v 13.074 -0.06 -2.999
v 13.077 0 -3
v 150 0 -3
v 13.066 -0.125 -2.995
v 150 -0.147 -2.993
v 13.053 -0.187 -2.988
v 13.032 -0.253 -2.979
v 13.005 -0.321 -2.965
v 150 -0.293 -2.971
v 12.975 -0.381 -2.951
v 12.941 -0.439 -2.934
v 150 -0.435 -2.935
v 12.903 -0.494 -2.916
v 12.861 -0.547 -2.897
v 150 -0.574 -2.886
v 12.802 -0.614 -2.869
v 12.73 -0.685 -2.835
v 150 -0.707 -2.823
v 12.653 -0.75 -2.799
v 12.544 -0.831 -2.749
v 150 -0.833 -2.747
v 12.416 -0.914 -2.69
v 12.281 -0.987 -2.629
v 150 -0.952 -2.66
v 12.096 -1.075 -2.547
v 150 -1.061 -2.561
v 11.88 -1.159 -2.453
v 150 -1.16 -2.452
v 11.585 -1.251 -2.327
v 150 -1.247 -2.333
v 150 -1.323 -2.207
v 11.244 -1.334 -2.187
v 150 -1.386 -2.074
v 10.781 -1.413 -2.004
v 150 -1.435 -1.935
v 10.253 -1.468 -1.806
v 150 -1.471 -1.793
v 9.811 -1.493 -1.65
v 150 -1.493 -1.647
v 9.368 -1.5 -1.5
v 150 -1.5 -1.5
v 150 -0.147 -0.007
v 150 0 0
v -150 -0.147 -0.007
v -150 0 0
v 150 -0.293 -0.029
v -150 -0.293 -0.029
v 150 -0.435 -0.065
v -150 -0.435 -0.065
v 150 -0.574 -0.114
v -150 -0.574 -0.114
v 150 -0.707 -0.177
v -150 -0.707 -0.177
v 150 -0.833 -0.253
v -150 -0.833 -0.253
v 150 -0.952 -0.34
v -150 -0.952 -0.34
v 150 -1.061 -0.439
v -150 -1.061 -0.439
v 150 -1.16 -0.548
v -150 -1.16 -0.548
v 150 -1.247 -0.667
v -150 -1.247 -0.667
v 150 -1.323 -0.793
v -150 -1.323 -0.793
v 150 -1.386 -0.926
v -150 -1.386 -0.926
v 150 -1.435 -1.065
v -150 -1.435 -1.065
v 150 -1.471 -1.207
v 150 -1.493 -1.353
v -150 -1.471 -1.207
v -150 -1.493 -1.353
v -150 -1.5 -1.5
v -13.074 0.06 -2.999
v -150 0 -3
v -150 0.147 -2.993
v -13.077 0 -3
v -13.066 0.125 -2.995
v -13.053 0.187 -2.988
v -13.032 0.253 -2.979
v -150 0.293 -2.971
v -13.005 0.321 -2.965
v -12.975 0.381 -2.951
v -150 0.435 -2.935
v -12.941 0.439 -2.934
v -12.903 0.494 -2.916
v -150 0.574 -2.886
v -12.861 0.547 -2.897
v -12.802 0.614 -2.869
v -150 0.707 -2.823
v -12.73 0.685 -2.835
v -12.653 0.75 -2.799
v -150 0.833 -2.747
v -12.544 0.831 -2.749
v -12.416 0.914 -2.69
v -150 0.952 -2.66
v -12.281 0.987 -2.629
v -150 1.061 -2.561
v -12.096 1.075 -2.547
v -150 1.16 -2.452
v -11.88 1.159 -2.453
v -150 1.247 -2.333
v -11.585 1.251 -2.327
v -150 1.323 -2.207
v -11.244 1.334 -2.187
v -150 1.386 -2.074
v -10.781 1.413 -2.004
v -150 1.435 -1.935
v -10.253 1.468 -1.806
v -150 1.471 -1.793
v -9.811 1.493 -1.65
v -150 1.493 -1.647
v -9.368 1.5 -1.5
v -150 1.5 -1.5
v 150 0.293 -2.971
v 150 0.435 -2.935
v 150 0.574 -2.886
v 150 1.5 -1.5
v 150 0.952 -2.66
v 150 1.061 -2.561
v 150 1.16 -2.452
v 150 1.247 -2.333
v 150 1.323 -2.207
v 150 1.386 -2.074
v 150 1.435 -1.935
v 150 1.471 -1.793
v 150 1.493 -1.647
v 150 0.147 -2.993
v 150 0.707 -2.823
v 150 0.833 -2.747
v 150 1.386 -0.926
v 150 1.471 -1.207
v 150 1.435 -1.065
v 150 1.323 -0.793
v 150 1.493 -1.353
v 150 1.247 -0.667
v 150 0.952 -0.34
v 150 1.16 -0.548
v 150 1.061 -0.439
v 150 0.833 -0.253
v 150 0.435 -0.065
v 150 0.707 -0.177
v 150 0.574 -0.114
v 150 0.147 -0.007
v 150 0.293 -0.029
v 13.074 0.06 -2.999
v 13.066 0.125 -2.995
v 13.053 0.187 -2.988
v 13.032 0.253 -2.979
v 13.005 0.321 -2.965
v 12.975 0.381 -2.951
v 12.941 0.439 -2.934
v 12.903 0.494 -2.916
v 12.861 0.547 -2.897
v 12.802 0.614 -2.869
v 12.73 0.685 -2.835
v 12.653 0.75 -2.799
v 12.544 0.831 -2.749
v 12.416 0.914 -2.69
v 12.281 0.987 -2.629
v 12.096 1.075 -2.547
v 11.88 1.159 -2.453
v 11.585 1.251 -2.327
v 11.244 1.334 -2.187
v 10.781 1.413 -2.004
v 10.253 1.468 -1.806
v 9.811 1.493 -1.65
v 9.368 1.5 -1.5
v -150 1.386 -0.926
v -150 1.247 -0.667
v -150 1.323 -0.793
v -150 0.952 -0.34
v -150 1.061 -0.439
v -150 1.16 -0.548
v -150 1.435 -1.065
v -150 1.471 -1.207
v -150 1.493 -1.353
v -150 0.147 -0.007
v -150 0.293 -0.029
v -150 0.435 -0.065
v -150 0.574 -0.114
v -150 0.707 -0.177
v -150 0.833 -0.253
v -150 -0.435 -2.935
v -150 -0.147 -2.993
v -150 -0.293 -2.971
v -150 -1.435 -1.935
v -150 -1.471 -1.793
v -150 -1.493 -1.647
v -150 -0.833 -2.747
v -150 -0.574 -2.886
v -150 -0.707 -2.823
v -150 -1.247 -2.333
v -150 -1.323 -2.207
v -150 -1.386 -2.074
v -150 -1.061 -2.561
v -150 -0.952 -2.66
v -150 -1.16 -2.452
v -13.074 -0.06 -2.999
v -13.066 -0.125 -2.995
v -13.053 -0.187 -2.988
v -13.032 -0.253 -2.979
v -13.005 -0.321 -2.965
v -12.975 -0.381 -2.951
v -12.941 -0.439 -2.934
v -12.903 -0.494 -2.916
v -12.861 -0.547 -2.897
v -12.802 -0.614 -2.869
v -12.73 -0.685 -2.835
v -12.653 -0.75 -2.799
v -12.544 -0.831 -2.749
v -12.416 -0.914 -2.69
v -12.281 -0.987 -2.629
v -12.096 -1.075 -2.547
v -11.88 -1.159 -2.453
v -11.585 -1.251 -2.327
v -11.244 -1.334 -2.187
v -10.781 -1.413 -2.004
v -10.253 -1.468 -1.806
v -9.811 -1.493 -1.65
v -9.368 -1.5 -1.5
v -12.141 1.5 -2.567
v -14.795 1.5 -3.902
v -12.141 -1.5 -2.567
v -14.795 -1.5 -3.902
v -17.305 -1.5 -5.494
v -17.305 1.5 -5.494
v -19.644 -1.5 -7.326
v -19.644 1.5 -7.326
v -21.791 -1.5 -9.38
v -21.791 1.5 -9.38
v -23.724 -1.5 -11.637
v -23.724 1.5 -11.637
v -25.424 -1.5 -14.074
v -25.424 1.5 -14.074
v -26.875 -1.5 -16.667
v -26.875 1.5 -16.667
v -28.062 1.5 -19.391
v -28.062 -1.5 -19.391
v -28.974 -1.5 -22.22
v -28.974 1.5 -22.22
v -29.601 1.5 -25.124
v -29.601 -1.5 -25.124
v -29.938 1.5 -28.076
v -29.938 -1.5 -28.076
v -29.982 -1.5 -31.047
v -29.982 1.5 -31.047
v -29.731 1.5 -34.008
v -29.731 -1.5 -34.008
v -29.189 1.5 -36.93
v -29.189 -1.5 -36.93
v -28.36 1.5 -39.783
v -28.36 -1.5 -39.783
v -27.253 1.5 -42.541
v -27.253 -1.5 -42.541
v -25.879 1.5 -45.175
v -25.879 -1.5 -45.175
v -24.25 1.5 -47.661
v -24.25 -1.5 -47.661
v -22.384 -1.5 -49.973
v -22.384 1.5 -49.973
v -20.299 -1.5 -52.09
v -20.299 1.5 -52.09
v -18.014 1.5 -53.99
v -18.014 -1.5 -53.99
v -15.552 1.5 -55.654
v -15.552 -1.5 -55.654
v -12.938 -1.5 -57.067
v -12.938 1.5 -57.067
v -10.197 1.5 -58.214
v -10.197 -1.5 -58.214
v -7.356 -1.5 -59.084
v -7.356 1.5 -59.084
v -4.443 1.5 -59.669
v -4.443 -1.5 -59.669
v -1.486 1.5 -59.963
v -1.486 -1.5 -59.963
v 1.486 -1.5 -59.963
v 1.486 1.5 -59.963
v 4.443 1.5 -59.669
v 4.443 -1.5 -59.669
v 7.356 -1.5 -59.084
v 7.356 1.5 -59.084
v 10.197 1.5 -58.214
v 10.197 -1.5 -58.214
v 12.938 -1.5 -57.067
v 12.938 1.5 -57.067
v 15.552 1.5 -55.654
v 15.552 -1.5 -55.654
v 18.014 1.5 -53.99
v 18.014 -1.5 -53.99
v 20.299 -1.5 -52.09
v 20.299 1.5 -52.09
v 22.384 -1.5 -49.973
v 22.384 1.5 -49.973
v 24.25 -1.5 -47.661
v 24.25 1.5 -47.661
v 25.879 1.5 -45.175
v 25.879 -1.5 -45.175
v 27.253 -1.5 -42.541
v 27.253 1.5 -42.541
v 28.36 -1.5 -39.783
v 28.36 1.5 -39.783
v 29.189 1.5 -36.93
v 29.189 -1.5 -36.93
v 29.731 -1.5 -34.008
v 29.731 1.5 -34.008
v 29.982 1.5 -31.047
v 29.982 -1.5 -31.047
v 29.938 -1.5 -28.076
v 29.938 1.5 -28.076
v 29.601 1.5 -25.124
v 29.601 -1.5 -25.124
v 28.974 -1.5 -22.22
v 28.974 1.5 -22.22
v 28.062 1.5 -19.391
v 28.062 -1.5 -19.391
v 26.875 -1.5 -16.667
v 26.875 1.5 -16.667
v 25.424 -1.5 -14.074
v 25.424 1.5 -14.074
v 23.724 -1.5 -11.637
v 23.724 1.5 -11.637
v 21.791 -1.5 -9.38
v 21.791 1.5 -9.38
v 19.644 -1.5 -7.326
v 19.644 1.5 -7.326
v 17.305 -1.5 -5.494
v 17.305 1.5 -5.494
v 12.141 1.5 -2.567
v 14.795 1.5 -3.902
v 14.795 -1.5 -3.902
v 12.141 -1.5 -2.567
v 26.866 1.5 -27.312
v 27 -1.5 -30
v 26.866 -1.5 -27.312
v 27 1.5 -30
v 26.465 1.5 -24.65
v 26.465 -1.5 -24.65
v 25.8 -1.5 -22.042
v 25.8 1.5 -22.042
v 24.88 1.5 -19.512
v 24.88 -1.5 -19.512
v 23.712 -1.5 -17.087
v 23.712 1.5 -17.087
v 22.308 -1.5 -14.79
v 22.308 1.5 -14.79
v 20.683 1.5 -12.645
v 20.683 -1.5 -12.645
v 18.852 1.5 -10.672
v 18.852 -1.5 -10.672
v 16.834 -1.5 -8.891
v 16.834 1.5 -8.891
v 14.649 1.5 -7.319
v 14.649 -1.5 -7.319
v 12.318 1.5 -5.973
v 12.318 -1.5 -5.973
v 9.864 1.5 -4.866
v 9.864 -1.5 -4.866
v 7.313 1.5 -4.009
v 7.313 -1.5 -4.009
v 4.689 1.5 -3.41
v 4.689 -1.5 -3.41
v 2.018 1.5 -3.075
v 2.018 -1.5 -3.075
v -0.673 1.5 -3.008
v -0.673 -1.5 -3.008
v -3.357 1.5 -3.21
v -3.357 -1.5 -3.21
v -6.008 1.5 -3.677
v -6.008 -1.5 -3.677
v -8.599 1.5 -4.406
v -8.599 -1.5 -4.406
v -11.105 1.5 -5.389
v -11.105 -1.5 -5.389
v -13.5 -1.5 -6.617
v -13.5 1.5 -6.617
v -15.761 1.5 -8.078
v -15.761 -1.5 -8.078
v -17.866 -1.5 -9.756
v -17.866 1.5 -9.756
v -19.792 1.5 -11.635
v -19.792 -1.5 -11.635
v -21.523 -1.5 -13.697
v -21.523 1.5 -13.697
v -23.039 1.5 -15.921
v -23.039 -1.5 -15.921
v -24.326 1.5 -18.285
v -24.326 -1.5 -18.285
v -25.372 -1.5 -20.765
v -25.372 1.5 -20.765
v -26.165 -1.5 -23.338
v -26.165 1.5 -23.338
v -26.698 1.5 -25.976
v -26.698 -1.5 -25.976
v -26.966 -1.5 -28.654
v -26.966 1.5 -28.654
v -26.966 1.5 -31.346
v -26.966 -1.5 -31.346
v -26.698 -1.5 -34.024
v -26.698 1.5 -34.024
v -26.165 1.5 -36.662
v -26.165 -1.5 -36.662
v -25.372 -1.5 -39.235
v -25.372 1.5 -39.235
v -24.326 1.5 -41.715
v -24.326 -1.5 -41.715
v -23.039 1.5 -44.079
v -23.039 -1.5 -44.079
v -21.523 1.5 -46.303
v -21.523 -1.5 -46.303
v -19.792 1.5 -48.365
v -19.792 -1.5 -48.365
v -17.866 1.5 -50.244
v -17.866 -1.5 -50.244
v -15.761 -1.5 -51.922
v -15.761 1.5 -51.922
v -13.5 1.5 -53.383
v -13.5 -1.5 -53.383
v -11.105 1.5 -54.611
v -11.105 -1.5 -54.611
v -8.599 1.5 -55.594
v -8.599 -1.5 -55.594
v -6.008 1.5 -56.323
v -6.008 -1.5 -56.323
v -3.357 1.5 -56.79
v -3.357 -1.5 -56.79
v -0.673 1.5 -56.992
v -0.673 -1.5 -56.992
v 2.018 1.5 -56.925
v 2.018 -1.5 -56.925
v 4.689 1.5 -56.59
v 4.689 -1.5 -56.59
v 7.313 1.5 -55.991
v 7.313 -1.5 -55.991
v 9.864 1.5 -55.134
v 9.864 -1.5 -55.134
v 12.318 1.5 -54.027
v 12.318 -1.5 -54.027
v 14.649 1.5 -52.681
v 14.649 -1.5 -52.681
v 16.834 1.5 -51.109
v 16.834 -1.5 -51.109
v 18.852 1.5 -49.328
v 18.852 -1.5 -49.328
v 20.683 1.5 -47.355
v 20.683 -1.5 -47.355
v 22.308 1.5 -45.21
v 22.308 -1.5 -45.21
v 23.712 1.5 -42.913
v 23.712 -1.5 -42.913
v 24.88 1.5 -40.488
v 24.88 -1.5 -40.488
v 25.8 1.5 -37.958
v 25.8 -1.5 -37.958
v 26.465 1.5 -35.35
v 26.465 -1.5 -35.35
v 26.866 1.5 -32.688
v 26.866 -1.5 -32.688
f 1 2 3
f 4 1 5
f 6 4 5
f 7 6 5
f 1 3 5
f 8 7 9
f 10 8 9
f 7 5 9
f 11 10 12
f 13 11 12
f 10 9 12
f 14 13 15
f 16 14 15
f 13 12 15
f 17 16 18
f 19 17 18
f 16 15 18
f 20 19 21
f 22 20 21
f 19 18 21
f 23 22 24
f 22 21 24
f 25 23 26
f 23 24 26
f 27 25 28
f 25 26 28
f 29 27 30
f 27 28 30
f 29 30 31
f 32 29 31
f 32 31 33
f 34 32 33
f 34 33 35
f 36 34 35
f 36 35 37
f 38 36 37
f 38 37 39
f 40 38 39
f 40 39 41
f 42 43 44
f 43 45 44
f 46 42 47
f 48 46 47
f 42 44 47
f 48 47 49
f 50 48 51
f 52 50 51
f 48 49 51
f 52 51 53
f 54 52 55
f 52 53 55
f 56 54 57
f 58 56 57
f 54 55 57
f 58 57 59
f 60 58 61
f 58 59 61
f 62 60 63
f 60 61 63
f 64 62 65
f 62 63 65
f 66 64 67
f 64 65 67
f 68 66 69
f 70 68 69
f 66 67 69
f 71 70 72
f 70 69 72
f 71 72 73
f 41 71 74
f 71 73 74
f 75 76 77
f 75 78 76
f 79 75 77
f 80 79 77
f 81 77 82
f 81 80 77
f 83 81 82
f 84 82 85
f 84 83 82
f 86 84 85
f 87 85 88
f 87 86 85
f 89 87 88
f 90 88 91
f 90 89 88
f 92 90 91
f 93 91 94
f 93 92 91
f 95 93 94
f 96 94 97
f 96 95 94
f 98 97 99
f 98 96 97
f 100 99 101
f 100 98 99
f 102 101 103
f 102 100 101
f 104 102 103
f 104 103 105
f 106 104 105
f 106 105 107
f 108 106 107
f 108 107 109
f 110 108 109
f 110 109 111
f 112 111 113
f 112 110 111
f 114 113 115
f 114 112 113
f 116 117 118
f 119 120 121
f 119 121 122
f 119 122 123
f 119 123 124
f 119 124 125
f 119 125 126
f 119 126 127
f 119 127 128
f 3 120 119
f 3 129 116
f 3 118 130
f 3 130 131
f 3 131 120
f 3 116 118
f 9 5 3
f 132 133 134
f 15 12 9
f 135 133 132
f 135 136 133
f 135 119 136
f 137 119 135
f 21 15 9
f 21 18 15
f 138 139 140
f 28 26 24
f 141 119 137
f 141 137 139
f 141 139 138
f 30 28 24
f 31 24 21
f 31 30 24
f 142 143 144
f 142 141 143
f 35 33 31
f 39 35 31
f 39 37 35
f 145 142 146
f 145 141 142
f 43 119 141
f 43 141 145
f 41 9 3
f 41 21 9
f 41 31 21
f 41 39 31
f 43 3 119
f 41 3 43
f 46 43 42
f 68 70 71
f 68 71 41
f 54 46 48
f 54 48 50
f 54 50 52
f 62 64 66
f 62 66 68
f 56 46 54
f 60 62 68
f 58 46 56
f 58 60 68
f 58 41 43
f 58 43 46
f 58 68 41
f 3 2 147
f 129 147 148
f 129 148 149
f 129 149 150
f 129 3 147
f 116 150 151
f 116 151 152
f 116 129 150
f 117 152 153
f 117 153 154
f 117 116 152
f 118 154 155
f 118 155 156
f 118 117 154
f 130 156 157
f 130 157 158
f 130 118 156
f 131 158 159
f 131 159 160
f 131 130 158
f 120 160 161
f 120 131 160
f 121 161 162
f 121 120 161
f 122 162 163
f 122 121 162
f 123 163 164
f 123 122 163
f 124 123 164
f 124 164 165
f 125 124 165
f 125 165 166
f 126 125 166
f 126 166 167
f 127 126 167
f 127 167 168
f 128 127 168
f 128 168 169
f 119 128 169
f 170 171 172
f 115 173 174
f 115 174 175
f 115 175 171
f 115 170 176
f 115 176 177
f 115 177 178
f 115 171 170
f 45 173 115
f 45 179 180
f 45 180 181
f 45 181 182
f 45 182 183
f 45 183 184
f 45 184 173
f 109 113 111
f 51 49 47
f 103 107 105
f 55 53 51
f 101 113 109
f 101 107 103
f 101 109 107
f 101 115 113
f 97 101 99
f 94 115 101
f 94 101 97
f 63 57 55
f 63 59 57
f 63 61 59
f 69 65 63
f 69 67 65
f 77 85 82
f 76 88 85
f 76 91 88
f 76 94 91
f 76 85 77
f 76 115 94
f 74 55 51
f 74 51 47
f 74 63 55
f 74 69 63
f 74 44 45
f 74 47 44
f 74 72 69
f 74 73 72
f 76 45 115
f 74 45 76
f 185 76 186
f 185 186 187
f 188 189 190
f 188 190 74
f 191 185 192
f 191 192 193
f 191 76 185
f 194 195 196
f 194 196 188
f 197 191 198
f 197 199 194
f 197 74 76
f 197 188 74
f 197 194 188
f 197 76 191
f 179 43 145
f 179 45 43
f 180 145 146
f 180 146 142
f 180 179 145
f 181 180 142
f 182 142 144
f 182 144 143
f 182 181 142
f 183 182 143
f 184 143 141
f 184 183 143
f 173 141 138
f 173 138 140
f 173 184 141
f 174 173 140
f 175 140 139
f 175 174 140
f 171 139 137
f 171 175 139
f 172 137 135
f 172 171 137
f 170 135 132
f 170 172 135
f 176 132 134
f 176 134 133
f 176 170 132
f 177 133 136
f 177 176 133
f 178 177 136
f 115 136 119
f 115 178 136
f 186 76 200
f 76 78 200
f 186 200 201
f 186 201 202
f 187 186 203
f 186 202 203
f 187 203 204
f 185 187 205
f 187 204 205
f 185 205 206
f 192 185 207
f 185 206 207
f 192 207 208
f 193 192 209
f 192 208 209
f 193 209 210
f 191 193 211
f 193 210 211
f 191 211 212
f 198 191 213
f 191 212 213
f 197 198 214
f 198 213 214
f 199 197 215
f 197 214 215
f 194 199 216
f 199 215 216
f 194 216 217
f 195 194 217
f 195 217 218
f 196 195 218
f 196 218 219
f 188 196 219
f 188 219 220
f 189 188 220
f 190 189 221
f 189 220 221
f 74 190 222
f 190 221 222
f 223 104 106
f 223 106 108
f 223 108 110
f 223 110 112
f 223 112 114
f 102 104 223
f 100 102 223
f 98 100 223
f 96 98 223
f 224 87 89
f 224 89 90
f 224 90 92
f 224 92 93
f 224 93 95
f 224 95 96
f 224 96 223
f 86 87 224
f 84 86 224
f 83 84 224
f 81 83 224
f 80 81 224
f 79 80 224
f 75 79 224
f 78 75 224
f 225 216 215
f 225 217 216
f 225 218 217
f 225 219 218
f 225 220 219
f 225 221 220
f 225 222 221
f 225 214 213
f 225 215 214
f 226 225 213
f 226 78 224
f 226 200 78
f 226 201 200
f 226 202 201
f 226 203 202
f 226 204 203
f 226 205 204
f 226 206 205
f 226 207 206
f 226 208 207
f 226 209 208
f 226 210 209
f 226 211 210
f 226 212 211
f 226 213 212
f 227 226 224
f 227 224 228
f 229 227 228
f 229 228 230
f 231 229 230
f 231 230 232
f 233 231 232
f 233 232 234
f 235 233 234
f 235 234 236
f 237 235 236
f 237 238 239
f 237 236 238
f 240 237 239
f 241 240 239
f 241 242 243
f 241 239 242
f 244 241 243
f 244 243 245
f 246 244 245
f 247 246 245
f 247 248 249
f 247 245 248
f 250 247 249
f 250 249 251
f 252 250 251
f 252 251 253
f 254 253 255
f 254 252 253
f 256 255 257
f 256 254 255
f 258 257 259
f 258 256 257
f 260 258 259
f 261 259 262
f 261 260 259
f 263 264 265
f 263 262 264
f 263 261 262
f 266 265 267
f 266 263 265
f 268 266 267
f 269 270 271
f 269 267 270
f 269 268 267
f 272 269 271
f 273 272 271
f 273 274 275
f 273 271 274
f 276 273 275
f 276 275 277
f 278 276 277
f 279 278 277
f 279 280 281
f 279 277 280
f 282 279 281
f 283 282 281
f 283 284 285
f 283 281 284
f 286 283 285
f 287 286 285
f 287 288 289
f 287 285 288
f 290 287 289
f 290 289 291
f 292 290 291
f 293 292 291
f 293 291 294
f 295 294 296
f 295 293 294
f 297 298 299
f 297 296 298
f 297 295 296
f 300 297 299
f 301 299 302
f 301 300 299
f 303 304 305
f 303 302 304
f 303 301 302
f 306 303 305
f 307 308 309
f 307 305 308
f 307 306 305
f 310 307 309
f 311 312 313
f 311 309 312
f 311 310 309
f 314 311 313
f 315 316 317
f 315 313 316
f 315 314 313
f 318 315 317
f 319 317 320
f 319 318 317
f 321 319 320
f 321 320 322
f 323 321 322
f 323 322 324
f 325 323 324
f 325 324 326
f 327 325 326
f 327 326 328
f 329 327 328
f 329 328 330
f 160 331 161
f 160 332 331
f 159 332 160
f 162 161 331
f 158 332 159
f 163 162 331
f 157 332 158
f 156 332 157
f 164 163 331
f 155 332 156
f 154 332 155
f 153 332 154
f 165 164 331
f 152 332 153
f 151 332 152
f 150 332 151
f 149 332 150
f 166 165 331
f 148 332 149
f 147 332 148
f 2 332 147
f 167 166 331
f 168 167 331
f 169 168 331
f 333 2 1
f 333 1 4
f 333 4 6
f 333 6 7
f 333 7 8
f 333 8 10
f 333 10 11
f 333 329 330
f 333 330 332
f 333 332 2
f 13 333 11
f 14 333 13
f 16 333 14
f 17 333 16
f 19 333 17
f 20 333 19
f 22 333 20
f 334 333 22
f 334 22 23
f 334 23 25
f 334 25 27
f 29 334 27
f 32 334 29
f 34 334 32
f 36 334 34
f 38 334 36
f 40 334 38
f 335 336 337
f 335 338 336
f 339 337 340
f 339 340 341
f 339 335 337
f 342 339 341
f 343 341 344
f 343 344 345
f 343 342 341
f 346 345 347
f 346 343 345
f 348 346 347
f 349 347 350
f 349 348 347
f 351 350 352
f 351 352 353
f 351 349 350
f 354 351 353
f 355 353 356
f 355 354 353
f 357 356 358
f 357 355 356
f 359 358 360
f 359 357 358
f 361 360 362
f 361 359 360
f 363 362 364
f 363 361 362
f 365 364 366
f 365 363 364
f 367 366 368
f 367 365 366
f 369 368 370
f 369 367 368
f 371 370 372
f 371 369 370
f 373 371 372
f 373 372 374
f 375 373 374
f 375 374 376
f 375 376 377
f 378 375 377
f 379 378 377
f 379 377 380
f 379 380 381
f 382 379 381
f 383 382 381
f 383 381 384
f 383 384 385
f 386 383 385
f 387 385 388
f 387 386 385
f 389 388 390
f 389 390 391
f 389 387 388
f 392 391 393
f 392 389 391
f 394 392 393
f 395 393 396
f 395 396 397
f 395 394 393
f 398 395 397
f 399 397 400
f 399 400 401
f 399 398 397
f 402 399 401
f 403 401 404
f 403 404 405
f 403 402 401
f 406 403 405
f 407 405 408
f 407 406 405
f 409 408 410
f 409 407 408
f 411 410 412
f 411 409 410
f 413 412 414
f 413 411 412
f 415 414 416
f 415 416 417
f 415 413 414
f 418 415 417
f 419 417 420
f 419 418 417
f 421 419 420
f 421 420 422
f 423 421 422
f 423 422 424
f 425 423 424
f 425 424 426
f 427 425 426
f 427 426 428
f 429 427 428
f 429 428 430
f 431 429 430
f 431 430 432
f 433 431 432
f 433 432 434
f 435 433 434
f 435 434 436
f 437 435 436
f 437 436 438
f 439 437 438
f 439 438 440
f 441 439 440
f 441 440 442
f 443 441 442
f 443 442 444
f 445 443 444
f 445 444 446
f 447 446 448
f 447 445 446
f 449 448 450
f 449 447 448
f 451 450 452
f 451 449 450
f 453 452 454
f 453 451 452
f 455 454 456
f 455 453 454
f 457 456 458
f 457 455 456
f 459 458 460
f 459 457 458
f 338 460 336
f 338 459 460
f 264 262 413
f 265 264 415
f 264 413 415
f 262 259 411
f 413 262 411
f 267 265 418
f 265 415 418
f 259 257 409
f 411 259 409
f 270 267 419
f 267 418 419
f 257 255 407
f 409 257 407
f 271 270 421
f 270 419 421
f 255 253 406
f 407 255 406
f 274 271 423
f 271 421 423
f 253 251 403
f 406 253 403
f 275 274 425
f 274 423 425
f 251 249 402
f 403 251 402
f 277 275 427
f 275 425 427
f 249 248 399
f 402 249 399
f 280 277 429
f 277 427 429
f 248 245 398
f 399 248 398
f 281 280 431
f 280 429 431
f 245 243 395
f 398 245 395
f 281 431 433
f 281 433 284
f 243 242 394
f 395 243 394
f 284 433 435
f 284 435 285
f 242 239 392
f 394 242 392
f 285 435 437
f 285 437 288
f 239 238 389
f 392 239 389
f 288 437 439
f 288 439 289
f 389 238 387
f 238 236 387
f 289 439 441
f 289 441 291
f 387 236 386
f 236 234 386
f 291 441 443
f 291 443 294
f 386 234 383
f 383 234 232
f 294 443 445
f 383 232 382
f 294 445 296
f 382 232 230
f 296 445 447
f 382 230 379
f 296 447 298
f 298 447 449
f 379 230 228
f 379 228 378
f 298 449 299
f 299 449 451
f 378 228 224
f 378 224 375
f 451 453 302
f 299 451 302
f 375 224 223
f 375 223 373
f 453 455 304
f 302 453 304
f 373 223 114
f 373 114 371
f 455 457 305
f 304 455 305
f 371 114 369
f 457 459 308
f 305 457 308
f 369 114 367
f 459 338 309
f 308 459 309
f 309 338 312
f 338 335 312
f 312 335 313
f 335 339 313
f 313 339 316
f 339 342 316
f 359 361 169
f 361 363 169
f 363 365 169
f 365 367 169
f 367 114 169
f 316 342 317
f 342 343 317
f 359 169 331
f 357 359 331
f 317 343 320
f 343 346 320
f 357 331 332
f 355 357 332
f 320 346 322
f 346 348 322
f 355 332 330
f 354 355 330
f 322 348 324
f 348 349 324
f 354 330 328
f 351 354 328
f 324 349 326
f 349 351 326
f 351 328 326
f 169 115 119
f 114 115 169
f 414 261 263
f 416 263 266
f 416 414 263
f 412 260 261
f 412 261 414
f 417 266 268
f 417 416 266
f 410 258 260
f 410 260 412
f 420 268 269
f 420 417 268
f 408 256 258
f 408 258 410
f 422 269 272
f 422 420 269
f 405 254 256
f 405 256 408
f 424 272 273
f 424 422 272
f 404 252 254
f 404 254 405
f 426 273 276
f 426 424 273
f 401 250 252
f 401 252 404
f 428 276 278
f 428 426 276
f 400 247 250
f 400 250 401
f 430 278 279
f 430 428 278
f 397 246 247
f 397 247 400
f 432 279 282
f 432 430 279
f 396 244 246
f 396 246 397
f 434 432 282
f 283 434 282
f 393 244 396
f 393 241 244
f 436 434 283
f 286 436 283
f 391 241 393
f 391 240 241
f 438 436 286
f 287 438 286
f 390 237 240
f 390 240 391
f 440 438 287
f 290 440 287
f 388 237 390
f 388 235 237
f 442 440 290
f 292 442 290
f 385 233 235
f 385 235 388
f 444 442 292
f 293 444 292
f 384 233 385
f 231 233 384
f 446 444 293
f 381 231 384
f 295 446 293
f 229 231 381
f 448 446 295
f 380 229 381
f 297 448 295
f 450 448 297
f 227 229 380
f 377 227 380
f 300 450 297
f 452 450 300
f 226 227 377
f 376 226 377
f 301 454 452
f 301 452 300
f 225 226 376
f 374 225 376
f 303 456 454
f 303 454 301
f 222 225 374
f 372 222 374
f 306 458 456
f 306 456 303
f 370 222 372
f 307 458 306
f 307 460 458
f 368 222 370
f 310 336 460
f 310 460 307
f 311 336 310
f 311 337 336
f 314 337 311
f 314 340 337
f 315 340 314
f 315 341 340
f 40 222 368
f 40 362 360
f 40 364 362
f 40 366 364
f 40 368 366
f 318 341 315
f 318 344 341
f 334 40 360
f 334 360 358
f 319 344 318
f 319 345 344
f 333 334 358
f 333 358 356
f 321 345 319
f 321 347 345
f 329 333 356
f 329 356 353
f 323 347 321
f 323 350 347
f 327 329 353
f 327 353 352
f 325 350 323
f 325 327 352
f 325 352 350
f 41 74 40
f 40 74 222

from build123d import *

# Parameters (mm, degrees)
F0_R     = 27
F1_DEPTH = 1.5
F2_R     = 1.49999


# Not quite as in the source:
# - a fillet or chamfer is up to 0.001 mm smaller than in the source, because OpenCascade refuses the exact size


with BuildPart() as f1:
    # F0 (on Front) → F1 (new body, symmetric)
    with BuildSketch(Plane.XZ):
        with BuildLine():
            Line((150, 0), (-150, 0))
            Line((-150, 0), (-150, -3))
            Line((-150, -3), (-13.0766968306, -3))
            ThreePointArc((-13.0766968306, -3), (0, -60), (13.0766968306, -3))
            Line((13.0766968306, -3), (150, -3))
            Line((150, -3), (150, 0))
        make_face()
        with Locations((0, -30)):
            Circle(F0_R, mode=Mode.SUBTRACT)
    extrude(amount=F1_DEPTH, both=True)

    # F2 (radius 1.5 in the source; OpenCascade refuses exactly that, so slightly less here)
    f2_edges = [f1.edges().sort_by_distance(p)[0] for p in [
        (-81.538348, -1.5, -3),
        (0, -1.5, 0),
        (0, 1.5, 0),
        (-81.538348, 1.5, -3),
        (81.538348, -1.5, -3),
        (81.538348, 1.5, -3),
    ]]
    fillet(f2_edges, radius=F2_R)


solid = f1.part
